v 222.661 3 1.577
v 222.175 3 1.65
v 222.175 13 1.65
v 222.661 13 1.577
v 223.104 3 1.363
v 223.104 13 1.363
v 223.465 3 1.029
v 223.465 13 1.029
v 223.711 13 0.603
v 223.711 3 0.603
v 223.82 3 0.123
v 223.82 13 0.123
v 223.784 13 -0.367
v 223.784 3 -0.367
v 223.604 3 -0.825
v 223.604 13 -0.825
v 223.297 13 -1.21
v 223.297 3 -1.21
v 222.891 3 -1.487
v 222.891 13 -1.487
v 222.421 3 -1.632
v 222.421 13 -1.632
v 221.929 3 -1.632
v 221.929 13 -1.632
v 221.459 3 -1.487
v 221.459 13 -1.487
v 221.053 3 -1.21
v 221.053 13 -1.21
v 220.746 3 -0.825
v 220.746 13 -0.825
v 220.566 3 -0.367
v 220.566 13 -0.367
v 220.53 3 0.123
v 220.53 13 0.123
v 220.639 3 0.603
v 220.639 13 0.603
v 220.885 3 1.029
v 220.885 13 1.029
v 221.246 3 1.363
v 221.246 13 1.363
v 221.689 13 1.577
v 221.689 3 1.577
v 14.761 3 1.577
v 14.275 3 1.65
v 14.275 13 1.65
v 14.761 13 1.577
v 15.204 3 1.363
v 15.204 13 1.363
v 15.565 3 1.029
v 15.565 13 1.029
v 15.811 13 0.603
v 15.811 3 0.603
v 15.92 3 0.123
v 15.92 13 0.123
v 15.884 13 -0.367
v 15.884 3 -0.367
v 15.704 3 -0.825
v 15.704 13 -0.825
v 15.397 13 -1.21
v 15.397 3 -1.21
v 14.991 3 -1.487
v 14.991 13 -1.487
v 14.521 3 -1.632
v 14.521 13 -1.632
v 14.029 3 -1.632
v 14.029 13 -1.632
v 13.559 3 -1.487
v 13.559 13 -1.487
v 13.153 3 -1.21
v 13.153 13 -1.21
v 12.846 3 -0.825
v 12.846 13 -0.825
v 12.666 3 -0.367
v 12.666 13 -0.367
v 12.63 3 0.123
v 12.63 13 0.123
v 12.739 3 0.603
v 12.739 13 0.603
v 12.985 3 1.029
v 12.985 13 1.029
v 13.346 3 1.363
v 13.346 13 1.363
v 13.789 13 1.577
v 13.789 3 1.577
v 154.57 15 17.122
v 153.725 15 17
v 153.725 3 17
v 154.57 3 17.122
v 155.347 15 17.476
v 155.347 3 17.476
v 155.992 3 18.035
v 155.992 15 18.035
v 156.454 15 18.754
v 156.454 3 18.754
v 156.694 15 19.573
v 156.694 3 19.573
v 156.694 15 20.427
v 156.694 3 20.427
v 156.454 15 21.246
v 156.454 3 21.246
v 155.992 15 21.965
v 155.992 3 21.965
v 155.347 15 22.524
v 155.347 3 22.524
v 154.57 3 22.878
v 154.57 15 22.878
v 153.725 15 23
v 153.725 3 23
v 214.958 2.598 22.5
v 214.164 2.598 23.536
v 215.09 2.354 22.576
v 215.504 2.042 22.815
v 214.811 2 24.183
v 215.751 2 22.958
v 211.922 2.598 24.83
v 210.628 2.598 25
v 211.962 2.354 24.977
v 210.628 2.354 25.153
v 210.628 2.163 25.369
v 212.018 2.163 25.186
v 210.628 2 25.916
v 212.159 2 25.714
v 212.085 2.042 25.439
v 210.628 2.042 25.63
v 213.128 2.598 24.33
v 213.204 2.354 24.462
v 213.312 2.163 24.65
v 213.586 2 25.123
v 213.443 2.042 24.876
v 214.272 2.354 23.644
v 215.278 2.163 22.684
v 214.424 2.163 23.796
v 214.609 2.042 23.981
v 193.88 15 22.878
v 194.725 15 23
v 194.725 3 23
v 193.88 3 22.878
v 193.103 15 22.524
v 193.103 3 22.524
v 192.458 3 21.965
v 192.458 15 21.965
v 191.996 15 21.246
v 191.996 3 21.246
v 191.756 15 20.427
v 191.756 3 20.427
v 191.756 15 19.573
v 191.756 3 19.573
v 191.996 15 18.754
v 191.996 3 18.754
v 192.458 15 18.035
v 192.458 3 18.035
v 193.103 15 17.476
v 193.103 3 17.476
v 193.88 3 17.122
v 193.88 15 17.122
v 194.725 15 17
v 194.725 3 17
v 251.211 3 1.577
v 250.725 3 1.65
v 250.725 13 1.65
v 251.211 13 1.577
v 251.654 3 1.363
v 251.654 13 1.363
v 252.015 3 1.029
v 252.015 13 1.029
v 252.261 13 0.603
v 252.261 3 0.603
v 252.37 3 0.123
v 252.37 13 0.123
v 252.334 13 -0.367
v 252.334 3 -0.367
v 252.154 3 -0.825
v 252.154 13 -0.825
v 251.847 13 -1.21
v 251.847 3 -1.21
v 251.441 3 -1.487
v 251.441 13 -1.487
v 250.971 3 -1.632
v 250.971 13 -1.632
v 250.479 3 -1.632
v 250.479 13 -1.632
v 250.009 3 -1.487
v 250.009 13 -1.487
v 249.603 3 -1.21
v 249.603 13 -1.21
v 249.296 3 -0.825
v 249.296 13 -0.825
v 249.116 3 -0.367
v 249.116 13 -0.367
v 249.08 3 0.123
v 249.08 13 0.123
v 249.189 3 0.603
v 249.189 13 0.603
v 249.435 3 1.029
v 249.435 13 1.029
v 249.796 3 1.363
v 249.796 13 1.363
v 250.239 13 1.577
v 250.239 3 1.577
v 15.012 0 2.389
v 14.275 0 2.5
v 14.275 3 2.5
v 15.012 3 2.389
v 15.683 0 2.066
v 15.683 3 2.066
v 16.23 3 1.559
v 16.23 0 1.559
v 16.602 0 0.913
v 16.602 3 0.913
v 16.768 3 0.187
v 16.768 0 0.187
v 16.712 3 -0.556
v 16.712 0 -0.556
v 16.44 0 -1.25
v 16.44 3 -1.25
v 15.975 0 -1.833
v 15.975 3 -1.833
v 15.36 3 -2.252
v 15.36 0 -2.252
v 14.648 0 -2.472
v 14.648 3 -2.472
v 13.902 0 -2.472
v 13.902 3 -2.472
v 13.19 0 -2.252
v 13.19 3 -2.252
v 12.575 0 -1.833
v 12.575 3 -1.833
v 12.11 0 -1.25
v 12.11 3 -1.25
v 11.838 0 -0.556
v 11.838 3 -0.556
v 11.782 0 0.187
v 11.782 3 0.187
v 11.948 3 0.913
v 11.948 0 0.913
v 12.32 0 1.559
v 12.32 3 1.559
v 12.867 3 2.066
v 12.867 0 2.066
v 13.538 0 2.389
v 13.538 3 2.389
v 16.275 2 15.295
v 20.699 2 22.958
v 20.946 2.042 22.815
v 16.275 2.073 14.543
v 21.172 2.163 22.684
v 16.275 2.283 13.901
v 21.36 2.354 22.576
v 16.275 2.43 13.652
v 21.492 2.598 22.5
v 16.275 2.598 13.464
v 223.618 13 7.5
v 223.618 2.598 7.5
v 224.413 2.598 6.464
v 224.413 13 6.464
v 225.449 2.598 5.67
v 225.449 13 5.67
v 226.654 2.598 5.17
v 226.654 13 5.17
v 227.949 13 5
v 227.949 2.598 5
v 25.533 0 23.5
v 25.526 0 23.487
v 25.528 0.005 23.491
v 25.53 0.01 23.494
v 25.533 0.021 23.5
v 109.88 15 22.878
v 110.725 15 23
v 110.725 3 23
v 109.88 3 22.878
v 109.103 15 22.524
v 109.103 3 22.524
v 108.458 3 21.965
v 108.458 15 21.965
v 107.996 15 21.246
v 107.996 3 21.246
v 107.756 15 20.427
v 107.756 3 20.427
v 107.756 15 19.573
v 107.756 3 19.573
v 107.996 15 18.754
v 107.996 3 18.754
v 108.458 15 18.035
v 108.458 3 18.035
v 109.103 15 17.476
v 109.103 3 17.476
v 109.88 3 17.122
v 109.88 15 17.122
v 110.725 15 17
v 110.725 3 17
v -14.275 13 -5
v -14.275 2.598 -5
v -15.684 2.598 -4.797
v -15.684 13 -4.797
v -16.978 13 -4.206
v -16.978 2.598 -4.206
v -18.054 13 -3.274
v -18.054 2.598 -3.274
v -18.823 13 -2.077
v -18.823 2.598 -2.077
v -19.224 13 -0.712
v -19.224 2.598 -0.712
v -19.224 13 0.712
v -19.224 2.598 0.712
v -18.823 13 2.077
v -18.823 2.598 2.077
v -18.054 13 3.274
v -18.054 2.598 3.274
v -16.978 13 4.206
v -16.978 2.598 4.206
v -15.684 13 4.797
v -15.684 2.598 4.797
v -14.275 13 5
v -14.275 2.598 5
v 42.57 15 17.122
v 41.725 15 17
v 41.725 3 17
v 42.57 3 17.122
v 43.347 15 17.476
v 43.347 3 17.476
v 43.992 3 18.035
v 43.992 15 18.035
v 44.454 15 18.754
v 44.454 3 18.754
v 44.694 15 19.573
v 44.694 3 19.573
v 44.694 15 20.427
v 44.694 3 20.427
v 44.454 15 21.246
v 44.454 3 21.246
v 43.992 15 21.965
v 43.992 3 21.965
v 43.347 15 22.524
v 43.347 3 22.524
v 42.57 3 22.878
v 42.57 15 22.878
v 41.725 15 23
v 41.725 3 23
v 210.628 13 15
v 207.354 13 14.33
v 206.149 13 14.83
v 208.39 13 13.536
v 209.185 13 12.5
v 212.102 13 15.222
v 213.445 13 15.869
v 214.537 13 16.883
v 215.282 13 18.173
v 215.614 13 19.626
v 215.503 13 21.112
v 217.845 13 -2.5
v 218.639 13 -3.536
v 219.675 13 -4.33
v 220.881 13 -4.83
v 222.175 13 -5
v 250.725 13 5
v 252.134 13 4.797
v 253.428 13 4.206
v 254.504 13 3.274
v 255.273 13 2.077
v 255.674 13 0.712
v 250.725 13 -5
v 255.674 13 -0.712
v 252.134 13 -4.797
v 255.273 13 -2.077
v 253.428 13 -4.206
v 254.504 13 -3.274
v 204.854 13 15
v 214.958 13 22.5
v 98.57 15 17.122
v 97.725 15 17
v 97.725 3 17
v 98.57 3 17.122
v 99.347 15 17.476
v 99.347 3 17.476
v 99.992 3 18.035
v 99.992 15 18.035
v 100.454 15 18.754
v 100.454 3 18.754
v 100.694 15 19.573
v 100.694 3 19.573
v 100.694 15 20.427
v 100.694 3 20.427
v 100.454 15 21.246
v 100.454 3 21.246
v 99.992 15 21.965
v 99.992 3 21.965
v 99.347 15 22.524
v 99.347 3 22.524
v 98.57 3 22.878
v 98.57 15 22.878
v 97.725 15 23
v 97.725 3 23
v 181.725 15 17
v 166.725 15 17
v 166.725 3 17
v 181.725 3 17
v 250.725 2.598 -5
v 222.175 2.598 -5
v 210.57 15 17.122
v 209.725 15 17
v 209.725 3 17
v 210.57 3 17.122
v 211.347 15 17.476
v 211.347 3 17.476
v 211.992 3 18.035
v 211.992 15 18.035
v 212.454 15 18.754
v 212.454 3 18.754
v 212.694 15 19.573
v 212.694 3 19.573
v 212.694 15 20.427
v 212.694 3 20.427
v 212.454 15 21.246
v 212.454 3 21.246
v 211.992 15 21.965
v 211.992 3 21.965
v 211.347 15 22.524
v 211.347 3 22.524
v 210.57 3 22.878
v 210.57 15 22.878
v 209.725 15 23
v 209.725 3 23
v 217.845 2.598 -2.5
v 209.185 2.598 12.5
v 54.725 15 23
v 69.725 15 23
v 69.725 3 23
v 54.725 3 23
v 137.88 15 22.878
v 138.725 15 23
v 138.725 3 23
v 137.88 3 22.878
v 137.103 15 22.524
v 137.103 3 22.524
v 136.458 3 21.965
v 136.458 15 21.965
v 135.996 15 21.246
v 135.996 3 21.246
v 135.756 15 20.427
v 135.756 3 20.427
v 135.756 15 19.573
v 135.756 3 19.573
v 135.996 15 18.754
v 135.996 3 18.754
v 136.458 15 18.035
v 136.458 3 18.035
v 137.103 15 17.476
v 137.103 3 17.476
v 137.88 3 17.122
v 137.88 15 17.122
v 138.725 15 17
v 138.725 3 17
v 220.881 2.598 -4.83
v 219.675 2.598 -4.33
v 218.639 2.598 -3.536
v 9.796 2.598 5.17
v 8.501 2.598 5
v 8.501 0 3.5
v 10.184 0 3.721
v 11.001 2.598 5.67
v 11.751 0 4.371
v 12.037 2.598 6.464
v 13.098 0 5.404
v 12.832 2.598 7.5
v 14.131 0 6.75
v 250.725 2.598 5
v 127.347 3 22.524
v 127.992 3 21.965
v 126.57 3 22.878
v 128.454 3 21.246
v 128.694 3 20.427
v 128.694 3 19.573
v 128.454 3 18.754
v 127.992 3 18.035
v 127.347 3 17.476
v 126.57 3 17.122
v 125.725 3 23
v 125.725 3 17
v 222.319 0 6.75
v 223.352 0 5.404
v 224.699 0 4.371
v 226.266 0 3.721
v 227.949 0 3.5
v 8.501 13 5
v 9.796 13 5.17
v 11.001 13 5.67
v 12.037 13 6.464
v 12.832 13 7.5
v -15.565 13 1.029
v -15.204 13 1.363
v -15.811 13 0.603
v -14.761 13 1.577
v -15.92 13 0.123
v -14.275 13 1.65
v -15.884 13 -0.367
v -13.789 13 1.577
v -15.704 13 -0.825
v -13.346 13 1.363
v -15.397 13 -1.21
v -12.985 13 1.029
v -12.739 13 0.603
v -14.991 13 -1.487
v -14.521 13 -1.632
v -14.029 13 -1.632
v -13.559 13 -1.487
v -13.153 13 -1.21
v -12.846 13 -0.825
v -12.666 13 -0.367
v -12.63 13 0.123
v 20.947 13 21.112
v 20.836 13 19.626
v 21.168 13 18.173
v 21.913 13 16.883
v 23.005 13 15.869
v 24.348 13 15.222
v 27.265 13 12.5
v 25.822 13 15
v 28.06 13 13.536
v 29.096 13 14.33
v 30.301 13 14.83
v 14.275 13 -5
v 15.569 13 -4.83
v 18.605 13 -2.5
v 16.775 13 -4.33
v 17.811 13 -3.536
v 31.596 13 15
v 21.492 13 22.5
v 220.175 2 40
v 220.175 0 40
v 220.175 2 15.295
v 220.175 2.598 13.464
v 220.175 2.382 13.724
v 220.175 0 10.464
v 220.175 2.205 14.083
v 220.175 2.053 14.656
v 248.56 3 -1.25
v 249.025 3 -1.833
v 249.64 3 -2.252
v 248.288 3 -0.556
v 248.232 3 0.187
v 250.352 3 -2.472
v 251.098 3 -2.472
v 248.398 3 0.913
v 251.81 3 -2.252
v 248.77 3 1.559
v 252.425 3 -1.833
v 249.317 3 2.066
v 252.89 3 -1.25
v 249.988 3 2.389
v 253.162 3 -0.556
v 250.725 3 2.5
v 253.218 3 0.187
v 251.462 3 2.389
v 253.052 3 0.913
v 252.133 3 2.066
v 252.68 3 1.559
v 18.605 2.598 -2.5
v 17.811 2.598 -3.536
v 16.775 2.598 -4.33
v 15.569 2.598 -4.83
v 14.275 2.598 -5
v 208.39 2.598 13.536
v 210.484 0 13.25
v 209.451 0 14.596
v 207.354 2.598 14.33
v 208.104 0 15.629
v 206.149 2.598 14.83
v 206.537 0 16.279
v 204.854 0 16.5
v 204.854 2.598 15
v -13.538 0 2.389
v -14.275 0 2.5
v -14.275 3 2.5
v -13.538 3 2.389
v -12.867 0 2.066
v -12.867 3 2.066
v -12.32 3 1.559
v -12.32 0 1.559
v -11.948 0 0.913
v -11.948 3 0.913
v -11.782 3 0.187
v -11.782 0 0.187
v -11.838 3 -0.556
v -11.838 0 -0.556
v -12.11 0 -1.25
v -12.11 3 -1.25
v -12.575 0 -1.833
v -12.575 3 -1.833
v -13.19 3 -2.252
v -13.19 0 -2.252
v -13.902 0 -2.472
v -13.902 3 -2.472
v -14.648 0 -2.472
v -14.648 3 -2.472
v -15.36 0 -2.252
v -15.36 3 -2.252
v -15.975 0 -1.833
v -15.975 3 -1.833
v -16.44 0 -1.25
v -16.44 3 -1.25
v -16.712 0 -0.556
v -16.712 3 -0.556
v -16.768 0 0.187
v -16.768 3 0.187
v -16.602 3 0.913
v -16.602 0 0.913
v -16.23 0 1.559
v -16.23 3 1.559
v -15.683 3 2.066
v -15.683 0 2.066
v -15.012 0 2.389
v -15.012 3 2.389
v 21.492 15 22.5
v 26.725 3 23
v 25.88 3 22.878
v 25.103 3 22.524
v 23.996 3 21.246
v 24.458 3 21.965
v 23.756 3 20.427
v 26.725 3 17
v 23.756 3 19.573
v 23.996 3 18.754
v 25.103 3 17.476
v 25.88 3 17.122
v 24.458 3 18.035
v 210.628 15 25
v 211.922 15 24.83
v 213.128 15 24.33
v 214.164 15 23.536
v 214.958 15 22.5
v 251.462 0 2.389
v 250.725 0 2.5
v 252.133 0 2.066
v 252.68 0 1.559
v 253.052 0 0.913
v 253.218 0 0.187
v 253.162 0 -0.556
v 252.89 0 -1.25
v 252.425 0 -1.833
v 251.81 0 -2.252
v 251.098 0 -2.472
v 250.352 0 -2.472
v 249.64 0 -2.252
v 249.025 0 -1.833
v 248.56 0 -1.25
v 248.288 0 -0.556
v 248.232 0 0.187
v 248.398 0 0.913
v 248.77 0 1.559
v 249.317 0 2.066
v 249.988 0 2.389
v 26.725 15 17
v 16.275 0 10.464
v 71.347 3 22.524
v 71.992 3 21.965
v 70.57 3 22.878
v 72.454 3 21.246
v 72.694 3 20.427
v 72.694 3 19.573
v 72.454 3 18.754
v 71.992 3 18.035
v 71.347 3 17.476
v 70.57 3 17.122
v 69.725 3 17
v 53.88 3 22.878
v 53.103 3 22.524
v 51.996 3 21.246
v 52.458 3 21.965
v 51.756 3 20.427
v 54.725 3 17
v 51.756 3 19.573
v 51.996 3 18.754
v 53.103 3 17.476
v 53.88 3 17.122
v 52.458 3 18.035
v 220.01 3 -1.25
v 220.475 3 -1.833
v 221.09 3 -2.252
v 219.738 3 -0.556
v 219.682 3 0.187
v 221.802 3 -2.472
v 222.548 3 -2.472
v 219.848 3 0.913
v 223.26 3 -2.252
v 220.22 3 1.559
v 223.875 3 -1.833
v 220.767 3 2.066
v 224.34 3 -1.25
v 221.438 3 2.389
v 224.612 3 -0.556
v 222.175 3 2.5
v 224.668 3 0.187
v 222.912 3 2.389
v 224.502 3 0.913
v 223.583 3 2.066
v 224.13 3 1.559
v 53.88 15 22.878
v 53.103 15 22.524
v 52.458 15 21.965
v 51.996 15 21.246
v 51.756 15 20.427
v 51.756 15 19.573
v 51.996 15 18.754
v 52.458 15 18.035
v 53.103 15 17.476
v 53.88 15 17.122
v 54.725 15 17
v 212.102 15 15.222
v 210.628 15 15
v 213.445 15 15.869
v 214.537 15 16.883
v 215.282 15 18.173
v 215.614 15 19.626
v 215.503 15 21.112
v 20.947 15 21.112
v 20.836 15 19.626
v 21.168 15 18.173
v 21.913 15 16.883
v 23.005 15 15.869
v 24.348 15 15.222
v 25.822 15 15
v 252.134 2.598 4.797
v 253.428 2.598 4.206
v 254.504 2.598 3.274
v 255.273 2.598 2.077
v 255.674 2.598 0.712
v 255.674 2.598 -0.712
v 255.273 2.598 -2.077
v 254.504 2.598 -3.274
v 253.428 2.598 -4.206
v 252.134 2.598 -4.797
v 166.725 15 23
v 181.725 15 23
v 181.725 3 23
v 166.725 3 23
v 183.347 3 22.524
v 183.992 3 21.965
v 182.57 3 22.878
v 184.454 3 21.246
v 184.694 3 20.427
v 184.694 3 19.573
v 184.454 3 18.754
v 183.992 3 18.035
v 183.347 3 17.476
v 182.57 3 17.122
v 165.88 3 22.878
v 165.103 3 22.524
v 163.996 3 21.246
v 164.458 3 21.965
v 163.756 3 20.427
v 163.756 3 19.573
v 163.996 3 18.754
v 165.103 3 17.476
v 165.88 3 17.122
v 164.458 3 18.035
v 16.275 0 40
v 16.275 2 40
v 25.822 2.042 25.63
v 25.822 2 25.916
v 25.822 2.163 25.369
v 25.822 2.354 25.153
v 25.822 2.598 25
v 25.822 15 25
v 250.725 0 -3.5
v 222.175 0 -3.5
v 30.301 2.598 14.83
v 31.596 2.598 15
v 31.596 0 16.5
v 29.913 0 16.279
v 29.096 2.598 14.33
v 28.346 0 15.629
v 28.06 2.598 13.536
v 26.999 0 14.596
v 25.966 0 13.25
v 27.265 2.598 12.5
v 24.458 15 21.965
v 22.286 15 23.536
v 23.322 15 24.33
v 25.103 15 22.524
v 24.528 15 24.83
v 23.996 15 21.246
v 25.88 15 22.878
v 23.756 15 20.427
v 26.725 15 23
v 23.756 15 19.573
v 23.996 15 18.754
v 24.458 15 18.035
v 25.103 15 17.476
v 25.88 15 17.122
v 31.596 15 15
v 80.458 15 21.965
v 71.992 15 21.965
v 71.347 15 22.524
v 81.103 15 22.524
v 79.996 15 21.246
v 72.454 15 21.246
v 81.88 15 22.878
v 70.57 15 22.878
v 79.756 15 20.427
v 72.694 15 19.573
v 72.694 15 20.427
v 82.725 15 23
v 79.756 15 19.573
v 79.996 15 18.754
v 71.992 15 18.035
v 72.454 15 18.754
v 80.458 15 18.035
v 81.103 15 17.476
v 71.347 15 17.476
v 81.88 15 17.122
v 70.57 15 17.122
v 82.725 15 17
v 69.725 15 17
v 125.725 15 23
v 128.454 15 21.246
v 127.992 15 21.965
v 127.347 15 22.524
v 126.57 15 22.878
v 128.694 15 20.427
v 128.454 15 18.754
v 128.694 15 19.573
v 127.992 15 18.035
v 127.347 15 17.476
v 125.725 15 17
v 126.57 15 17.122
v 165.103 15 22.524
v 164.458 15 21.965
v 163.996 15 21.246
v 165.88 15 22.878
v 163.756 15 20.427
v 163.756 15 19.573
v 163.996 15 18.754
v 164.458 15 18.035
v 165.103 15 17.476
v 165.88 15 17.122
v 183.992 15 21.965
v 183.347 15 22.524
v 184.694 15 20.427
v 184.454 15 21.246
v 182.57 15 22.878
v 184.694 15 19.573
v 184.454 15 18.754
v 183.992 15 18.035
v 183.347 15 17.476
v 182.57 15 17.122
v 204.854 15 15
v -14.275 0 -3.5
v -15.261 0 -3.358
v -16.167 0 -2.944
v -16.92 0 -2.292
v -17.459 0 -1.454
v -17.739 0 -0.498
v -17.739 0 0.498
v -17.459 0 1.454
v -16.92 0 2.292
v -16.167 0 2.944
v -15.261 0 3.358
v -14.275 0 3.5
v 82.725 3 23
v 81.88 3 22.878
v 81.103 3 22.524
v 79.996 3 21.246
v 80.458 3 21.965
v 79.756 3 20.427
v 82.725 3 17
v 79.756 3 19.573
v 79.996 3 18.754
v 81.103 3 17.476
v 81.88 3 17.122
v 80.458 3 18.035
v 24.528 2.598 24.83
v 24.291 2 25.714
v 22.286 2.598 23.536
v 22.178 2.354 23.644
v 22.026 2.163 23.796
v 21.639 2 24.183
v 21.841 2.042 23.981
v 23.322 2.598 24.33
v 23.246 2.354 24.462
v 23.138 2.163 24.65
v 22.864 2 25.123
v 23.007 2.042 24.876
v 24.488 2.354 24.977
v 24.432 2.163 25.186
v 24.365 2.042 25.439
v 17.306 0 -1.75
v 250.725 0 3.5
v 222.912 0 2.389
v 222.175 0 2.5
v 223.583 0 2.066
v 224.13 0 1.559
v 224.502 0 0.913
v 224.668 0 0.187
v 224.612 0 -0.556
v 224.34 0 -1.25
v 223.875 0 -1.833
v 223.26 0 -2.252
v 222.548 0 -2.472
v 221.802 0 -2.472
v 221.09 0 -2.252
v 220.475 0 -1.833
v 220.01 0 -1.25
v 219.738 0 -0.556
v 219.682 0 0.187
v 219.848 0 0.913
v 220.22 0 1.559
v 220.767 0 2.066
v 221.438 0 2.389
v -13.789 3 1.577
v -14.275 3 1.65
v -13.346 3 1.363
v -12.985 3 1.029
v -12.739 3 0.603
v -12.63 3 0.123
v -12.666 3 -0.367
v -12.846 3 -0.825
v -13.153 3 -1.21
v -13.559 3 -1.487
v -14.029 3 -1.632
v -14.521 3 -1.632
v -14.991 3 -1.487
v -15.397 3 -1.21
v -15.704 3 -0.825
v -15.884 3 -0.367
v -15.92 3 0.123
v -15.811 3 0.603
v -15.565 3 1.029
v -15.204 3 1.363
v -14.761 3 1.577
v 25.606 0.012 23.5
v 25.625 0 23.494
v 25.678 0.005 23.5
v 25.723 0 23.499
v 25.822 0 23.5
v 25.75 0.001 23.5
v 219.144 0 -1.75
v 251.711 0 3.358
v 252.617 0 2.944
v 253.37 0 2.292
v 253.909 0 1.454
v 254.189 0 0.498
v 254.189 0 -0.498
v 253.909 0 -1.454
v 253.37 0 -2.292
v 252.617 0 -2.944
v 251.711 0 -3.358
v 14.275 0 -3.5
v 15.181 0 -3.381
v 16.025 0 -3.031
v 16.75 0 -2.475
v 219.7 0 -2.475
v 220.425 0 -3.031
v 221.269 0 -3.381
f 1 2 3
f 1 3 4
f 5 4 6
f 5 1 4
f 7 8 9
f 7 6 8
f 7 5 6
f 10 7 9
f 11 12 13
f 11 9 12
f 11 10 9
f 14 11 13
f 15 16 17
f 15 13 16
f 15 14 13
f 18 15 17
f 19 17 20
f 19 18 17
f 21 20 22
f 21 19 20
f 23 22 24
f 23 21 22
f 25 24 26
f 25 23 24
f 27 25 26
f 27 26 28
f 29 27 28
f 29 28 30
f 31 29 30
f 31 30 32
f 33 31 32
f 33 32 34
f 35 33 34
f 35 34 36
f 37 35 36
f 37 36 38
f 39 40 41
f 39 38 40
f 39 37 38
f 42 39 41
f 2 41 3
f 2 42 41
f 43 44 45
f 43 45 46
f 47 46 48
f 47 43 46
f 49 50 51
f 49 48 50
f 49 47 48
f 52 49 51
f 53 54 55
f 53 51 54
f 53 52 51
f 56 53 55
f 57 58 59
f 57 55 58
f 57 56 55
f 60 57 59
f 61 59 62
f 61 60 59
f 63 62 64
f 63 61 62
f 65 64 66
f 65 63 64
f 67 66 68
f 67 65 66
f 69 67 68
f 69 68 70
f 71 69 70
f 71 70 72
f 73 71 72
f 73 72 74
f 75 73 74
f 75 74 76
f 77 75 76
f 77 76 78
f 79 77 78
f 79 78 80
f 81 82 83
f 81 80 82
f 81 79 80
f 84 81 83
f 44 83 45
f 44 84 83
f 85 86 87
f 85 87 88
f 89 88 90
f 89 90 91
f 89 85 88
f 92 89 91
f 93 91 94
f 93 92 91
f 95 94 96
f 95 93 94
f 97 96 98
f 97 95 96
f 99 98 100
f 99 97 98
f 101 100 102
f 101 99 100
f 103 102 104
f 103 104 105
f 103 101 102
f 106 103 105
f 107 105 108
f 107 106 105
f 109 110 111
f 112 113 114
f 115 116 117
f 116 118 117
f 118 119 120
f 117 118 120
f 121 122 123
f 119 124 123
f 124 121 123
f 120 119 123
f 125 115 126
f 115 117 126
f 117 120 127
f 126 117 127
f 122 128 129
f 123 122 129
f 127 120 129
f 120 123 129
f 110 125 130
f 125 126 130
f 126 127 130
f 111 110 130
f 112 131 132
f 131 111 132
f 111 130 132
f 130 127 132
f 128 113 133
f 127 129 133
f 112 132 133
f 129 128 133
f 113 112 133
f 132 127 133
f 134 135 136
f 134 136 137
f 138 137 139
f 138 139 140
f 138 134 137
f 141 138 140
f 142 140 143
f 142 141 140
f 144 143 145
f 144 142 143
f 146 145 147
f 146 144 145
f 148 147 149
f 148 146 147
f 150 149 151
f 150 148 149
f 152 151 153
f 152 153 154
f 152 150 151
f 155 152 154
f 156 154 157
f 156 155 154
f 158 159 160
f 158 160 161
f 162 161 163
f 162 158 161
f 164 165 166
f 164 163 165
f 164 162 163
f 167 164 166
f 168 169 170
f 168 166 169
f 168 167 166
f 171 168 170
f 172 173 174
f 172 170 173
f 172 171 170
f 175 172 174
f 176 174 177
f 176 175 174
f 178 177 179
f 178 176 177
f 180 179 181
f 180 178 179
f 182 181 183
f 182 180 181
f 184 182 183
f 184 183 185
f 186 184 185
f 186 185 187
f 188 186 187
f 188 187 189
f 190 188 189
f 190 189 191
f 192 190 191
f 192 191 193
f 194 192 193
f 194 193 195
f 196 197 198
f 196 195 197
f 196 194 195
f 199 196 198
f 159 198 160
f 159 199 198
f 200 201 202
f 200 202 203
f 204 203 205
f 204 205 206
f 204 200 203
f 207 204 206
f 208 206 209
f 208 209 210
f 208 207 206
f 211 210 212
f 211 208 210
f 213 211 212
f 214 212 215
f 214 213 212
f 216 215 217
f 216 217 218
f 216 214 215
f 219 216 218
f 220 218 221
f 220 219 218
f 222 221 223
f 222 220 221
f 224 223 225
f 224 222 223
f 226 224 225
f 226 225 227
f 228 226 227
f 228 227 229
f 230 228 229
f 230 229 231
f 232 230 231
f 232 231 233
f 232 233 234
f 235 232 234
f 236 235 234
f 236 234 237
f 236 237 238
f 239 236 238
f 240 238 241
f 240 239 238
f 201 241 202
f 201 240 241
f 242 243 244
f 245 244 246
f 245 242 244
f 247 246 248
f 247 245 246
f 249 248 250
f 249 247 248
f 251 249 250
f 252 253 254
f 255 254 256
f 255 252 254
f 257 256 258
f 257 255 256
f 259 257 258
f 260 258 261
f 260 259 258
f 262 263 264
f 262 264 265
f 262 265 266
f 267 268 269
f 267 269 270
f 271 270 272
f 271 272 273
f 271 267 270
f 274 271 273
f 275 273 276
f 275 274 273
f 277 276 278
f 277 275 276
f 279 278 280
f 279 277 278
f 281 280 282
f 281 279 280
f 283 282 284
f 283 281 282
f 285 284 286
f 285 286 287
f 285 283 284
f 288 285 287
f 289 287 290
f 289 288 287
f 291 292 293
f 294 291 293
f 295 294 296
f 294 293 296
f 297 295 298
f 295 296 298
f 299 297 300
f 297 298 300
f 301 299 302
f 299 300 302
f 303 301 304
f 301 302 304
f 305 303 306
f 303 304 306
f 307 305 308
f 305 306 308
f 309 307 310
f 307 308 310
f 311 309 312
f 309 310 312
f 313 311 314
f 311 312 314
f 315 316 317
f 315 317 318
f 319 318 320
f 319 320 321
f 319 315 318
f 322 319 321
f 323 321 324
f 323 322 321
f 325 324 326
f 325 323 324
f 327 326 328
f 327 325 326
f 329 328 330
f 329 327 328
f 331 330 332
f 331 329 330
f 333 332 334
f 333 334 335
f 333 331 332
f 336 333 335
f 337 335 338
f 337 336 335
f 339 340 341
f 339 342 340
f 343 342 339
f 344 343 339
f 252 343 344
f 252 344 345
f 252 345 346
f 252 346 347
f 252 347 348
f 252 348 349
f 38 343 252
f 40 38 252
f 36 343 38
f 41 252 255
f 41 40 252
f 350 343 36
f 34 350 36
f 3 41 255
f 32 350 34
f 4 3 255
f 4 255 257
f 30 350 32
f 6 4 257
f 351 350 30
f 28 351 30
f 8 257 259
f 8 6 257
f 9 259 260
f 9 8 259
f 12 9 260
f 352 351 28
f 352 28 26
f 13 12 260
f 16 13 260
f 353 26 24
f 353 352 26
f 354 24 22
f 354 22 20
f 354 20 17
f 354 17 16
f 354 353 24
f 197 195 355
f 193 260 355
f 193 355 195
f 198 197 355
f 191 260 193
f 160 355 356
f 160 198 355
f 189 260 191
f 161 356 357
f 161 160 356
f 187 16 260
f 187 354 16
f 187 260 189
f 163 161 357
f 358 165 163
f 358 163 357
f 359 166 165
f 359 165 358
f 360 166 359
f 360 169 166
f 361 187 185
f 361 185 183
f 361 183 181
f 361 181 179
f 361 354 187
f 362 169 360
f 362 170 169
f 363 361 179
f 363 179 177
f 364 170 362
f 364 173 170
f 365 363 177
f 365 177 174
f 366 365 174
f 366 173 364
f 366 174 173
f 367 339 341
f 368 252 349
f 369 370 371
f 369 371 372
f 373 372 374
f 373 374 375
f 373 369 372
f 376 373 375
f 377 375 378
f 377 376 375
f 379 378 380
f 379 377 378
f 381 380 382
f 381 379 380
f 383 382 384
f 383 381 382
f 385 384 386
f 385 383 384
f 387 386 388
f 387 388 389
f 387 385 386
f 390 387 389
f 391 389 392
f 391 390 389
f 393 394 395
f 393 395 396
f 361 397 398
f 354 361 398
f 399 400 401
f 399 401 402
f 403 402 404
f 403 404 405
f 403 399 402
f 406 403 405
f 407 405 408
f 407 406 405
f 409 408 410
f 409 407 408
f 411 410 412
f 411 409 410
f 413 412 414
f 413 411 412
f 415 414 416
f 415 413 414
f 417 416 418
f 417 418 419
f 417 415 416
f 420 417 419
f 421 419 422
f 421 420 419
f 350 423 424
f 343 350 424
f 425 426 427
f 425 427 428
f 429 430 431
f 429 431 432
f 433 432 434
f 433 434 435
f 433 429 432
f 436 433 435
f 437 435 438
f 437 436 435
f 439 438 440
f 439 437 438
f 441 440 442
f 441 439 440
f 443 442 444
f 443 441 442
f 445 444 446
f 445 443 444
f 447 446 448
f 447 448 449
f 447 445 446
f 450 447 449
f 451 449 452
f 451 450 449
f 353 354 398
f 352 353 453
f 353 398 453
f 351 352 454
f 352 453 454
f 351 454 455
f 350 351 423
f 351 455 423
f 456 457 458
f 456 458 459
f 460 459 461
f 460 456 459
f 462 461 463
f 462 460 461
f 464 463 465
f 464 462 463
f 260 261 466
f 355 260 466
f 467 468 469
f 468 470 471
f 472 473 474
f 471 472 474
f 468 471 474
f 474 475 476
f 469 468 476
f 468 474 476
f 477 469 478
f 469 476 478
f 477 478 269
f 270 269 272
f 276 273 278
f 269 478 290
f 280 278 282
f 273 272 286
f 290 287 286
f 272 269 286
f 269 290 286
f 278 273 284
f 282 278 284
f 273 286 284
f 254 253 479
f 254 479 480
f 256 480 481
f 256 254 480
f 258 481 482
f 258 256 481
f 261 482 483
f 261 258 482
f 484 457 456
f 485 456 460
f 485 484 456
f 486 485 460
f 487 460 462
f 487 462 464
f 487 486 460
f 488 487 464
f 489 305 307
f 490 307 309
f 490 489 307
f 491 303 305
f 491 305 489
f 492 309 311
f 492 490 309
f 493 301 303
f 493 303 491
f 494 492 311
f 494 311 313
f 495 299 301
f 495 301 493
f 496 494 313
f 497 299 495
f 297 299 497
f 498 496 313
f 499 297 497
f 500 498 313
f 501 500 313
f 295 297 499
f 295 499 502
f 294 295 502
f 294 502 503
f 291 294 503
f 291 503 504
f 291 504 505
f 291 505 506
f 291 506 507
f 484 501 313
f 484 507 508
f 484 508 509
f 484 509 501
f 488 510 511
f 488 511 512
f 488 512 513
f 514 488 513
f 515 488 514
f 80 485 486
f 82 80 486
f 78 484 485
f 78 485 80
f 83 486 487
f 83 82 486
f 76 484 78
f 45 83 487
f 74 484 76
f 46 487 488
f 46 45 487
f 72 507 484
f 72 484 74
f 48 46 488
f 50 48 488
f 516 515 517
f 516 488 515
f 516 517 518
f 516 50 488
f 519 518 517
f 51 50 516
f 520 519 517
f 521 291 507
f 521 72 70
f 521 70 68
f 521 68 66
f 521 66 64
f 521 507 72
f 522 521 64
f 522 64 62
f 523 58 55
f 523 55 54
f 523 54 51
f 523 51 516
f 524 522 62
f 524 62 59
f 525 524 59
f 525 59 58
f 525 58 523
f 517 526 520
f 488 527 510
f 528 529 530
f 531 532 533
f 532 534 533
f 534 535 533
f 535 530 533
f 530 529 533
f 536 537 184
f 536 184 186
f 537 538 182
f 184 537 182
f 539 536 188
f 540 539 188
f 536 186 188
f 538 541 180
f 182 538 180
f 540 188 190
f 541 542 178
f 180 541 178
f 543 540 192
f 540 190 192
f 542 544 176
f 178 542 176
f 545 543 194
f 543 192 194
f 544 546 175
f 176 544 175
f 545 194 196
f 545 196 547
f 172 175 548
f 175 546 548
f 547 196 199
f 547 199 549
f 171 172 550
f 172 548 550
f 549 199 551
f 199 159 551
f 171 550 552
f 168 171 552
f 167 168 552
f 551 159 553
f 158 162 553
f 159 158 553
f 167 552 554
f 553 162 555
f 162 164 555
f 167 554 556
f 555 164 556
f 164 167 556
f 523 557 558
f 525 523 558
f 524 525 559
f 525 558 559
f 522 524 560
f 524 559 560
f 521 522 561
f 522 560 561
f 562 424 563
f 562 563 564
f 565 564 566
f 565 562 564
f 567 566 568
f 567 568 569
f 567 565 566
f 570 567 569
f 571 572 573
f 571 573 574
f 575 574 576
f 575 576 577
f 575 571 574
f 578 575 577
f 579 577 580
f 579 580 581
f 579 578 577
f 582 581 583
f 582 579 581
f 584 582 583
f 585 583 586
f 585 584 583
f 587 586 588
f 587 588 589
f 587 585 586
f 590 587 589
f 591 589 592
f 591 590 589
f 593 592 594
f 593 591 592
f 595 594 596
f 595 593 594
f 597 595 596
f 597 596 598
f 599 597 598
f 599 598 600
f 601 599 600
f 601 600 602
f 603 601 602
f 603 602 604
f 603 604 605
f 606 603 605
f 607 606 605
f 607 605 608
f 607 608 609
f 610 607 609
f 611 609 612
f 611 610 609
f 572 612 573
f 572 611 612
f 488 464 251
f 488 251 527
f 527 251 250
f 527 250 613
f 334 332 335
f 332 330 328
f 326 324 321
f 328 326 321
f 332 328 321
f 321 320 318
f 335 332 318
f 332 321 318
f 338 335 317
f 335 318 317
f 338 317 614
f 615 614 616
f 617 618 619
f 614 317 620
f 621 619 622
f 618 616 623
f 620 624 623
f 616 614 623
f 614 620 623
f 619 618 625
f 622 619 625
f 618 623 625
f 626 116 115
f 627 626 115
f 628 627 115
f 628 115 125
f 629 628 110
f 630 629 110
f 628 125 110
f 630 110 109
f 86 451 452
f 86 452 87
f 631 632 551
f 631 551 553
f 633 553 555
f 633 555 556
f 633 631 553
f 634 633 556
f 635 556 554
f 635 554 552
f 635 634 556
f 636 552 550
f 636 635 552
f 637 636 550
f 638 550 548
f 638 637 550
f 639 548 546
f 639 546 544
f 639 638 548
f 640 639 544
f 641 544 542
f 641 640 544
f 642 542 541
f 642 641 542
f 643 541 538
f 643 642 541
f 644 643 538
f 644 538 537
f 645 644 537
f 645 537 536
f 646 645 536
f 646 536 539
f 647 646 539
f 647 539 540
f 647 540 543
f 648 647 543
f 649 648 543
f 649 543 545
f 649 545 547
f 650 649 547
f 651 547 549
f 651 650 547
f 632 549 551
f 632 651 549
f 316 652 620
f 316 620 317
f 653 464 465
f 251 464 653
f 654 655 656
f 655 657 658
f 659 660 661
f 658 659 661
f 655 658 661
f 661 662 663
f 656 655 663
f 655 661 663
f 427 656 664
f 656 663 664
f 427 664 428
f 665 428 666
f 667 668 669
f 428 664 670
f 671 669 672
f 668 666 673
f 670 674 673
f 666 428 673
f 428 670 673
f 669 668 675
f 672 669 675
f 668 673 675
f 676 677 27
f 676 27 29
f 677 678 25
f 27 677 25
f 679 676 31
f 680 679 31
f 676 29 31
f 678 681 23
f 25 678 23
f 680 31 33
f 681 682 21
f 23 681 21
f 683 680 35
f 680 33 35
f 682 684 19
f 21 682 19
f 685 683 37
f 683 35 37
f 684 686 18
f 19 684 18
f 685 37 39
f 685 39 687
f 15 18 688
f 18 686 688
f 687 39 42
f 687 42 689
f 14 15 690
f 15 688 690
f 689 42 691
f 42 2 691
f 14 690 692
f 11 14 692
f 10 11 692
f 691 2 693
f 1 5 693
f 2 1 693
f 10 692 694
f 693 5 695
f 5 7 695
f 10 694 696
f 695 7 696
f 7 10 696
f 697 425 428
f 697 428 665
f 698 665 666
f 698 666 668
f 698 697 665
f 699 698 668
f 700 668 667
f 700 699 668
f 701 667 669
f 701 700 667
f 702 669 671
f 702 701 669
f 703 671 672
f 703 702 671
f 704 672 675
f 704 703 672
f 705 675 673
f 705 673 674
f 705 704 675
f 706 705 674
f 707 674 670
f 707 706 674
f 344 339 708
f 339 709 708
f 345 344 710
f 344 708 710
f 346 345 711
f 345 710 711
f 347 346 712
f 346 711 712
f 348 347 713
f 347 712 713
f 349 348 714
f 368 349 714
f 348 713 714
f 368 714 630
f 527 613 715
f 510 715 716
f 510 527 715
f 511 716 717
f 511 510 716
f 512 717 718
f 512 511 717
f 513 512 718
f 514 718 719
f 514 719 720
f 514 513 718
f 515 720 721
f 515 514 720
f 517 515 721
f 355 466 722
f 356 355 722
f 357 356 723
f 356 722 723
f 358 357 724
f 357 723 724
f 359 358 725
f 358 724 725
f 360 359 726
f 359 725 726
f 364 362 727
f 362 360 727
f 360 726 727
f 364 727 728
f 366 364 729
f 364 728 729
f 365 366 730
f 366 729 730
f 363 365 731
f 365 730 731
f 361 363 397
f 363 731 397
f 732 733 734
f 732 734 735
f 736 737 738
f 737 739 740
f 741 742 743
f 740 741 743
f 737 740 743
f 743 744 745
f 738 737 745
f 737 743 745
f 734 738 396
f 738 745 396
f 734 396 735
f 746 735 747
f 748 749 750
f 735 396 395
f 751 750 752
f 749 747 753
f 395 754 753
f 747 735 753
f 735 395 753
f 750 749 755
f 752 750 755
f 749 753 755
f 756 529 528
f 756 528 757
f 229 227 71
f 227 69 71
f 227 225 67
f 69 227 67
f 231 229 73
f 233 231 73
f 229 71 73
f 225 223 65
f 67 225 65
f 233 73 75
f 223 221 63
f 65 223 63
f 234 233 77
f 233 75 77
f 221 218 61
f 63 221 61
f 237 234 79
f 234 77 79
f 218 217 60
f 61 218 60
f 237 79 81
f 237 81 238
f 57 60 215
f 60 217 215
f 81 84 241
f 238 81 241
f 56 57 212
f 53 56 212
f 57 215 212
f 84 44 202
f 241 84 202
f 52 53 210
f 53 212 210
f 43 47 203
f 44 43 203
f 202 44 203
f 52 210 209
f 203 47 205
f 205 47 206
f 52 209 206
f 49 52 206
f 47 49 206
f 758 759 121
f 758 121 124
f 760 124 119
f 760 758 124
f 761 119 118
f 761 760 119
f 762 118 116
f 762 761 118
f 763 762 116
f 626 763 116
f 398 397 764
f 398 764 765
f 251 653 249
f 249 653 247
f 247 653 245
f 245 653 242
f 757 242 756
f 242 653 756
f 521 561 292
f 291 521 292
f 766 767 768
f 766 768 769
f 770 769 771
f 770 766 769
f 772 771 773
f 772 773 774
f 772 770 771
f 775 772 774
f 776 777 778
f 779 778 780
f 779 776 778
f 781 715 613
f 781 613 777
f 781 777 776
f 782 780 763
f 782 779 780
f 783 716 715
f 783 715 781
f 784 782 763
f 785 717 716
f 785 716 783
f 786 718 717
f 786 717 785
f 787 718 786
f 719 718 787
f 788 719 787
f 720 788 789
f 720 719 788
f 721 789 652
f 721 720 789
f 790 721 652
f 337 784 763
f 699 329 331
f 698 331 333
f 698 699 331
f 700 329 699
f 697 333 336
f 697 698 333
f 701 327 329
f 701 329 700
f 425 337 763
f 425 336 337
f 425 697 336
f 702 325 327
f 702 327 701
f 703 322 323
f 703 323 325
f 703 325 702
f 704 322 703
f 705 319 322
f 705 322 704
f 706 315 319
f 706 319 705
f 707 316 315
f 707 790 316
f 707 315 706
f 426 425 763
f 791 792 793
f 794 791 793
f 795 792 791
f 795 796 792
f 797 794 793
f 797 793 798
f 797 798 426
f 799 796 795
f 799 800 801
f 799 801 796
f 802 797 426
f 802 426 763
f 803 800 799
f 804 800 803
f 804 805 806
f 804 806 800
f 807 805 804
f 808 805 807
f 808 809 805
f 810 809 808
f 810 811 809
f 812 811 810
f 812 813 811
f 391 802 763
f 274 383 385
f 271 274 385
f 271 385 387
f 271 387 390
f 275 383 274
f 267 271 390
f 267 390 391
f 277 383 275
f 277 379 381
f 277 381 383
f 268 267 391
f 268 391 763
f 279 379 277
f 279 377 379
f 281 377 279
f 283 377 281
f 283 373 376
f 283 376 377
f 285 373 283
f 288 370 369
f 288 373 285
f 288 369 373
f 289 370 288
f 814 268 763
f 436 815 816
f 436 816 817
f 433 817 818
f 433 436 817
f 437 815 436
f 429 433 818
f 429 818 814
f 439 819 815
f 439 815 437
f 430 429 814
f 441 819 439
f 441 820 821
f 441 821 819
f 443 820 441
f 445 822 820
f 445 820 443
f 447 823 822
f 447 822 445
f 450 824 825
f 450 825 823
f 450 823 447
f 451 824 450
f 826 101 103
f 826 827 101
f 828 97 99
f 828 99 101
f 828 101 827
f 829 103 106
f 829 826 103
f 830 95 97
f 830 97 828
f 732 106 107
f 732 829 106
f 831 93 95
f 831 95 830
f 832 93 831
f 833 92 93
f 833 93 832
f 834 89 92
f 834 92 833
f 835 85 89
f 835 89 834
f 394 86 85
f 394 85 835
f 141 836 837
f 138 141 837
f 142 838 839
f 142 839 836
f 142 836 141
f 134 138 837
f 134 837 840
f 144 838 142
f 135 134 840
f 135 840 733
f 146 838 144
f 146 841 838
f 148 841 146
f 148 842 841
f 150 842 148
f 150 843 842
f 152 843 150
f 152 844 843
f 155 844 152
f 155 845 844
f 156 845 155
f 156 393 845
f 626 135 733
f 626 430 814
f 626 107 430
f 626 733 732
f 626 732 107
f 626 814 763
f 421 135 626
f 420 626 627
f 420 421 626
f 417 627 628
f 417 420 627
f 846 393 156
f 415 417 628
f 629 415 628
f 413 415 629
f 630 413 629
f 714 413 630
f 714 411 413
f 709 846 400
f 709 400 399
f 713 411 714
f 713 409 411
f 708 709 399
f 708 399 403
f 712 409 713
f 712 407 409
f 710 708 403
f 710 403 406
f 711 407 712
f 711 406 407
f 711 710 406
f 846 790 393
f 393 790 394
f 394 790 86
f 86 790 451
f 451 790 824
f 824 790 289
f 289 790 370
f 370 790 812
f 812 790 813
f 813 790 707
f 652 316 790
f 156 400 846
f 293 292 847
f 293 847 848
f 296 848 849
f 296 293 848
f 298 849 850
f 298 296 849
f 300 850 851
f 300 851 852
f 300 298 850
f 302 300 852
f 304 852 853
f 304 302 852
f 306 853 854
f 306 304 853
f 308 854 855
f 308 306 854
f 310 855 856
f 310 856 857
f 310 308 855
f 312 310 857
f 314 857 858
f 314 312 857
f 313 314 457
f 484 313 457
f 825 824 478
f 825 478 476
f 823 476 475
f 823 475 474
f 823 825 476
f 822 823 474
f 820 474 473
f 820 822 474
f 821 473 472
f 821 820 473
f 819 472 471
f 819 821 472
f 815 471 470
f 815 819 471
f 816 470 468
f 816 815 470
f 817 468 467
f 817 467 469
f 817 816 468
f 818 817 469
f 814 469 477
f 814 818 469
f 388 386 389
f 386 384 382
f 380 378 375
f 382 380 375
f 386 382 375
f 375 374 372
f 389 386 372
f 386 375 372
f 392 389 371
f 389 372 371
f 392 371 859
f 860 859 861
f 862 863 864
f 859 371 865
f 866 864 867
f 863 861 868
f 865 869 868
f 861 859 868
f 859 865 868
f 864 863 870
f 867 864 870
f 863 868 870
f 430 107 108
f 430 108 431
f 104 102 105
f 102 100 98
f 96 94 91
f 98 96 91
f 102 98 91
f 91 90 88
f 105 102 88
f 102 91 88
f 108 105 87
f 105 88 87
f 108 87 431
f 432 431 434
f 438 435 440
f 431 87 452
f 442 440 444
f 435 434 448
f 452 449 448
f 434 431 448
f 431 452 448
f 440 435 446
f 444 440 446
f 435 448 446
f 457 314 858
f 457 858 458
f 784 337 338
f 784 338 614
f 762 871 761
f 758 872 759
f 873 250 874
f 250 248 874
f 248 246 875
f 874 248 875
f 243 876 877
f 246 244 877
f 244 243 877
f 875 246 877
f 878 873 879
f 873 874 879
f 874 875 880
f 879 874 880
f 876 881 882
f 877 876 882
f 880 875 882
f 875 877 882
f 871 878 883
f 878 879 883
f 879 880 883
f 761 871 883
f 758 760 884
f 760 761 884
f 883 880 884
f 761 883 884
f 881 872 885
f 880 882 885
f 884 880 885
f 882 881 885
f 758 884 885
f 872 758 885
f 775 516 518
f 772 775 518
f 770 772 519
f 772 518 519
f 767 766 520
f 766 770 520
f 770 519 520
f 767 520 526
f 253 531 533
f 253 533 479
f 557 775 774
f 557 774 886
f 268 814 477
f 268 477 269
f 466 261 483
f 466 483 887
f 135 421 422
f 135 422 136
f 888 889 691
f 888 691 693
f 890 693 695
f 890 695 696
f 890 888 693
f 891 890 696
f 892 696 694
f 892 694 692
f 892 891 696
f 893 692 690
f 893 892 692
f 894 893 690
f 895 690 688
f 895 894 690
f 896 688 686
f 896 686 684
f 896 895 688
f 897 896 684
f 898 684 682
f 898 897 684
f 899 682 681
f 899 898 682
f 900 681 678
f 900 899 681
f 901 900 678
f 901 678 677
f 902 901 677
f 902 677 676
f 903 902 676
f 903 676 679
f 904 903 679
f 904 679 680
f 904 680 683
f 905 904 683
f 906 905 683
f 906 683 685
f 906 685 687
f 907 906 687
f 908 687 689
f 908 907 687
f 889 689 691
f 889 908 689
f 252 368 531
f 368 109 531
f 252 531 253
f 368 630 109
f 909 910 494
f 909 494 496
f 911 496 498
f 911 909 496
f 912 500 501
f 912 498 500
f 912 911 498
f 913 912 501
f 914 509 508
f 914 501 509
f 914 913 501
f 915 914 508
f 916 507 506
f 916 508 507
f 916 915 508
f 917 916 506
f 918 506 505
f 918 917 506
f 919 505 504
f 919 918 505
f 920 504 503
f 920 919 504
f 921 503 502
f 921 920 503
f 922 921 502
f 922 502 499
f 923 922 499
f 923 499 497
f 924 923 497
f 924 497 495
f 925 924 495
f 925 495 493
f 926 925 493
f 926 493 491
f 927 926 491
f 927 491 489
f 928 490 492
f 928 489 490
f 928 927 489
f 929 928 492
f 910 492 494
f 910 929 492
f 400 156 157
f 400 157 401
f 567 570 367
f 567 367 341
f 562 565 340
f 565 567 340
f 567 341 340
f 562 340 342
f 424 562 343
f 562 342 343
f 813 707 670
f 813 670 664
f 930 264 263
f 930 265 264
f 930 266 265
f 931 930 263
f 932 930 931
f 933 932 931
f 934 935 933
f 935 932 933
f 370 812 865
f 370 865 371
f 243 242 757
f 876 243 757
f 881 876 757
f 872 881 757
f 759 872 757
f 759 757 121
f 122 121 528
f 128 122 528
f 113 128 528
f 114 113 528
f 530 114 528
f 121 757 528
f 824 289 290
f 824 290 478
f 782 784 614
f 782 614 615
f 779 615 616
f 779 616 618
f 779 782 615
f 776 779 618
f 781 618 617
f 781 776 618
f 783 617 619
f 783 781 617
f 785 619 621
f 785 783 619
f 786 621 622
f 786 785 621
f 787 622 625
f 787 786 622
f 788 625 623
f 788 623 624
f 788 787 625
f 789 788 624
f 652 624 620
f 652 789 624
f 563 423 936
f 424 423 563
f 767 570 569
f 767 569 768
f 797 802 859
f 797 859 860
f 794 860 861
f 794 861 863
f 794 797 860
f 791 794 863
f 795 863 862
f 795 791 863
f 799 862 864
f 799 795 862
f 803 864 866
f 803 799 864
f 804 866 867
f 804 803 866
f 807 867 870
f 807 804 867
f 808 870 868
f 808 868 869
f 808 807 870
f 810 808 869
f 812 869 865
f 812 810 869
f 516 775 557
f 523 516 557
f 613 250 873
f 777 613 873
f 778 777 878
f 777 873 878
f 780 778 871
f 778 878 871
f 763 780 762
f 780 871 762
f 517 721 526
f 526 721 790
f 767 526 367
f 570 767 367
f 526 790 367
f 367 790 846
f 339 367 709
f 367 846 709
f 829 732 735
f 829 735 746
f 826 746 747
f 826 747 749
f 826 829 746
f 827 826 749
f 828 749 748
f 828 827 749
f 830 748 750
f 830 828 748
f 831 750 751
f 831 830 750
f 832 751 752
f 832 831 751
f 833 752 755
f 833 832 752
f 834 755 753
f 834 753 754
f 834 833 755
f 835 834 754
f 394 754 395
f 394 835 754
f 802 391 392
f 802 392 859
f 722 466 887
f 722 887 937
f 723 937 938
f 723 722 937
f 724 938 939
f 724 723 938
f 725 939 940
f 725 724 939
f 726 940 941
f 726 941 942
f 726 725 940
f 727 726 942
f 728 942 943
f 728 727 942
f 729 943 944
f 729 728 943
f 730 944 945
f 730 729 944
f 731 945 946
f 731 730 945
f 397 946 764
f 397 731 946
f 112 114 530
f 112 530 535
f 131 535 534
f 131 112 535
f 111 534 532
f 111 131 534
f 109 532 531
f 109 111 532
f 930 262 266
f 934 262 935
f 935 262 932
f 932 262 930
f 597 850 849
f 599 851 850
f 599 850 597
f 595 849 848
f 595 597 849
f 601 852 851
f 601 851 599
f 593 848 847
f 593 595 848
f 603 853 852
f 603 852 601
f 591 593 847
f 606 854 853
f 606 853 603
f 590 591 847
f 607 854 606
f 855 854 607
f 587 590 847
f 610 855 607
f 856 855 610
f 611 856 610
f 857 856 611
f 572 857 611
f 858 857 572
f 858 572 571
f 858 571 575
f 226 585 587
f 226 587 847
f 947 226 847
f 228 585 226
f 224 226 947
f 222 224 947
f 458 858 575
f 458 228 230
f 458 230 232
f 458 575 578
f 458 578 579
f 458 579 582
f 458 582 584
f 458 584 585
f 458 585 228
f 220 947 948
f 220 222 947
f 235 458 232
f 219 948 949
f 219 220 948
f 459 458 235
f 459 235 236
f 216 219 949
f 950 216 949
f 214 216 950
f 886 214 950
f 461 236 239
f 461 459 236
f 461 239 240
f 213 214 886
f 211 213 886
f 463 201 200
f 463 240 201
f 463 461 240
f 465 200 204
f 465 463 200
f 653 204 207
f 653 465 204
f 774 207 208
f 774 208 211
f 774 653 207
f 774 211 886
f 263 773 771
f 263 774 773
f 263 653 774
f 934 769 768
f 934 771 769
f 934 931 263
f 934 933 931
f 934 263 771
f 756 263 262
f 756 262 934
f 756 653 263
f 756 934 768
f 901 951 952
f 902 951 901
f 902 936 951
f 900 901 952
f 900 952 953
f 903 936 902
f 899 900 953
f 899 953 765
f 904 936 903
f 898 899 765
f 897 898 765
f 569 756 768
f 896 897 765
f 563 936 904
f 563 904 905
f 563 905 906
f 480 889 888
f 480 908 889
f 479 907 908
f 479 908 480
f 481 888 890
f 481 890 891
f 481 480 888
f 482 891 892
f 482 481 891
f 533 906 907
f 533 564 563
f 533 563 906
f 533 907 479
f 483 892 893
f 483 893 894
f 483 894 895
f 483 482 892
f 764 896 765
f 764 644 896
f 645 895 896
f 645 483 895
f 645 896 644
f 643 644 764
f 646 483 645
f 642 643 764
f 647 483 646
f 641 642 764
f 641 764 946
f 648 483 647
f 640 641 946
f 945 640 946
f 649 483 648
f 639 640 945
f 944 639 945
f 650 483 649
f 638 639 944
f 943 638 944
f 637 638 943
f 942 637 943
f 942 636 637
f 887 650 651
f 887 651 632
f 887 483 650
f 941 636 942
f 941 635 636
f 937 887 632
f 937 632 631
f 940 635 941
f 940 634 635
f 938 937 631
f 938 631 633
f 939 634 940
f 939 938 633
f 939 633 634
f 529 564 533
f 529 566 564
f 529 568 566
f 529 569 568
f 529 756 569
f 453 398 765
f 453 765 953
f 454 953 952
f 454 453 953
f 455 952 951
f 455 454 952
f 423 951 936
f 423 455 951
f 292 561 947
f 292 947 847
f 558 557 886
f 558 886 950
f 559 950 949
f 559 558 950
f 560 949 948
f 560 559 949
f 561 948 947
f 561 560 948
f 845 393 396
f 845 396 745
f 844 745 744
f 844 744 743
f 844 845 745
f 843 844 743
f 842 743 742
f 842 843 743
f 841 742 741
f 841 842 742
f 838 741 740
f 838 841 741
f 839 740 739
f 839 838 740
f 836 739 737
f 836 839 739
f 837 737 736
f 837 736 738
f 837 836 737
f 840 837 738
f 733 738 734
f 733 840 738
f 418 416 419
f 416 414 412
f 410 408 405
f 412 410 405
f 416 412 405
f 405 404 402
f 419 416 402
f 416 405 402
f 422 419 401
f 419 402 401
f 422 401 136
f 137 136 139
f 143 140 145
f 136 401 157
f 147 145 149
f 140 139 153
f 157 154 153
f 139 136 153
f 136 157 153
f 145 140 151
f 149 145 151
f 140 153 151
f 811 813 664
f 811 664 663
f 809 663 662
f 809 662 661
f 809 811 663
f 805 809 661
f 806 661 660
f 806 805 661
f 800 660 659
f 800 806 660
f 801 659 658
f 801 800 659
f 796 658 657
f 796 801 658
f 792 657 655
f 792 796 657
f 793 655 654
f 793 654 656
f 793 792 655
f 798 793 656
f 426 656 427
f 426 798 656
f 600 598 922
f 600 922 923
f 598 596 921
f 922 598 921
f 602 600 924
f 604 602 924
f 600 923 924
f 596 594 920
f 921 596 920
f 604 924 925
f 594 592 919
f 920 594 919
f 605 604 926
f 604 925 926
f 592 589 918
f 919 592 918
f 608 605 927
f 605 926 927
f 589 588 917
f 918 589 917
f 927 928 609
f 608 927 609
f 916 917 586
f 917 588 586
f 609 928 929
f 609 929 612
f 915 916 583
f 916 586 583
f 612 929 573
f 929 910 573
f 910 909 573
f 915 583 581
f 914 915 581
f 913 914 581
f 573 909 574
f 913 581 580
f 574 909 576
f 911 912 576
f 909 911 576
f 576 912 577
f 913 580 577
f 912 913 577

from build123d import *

# Parameters (mm, degrees)
SKETCH_1_R                 = 1.65
EXTRUDE_1_DEPTH            = 15
FILLET_1_R                 = 5
CHAMFER_1_SIZE             = 1.5
CHAMFER_1_SIZE2            = 2.598076211
SKETCH_3_R                 = 2.5
CUT_EXTRUDE_1_DEPTH        = 3
SKETCH_4_W                 = 353.760068279
SKETCH_4_H                 = 71.916373997
CUT_EXTRUDE_2_DEPTH        = 2
FILLET_2_R                 = 5
CUT_EXTRUDE_3_DEPTH        = 12
PATTERN_LINEAR_1_COUNT     = 4
PATTERN_LINEAR_1_PITCH     = 28
PATTERN_LINEAR_1_COL_COUNT = 4
PATTERN_LINEAR_1_COL_PITCH = 28
EXTRUDE_2_DEPTH            = 2
FILLET_3_R                 = 1


# Some blends are built 0.0001 mm under size
with BuildPart() as part:
    # 草图1 → 凸台-拉伸1 (new body)
    with BuildSketch(Plane(origin=(0, 0, 0), x_dir=(1, 0, 0), z_dir=(0, 1, 0))):
        with BuildLine():
            Line((14.275, 5), (-14.275, 5))
            ThreePointArc((-14.275, 5), (-19.275, 0), (-14.275, -5))
            Line((-14.275, -5), (11.388248654, -5))
            Line((11.388248654, -5), (21.491878365, -22.5))
            ThreePointArc((21.491878365, -22.5), (23.322005384, -24.330127019), (25.822005384, -25))
            Line((25.822005384, -25), (210.627994616, -25))
            ThreePointArc((210.627994616, -25), (213.127994616, -24.330127019), (214.958121635, -22.5))
            Line((214.958121635, -22.5), (225.061751346, -5))
            Line((225.061751346, -5), (250.725, -5))
            ThreePointArc((250.725, -5), (255.725, 0), (250.725, 5))
            Line((250.725, 5), (222.175, 5))
            ThreePointArc((222.175, 5), (219.675, 4.330127019), (217.844872981, 2.5))
            Line((217.844872981, 2.5), (207.74124327, -15))
            Line((207.74124327, -15), (28.70875673, -15))
            Line((28.70875673, -15), (18.605127019, 2.5))
            ThreePointArc((18.605127019, 2.5), (16.775, 4.330127019), (14.275, 5))
        make_face()
        with Locations(Location((-14.275, 0, 0), (0, 0, 270))):
            Circle(SKETCH_1_R, mode=Mode.SUBTRACT)
        with Locations(Location((14.275, 0, 0), (0, 0, 270))):
            Circle(SKETCH_1_R, mode=Mode.SUBTRACT)
        with Locations(Location((222.175, 0, 0), (0, 0, 270))):
            Circle(SKETCH_1_R, mode=Mode.SUBTRACT)
        with Locations(Location((250.725, 0, 0), (0, 0, 270))):
            Circle(SKETCH_1_R, mode=Mode.SUBTRACT)
    extrude(amount=EXTRUDE_1_DEPTH)

    # 圆角1
    fillet_1_edges = [part.edges().sort_by_distance(p)[0] for p in [
        (225.061751346, 7.5, 5),
        (11.388248654, 7.5, 5),
        (28.70875673, 7.5, 15),
        (207.74124327, 7.5, 15),
    ]]
    fillet(fillet_1_edges, radius=FILLET_1_R)

    # 倒角1
    chamfer_1_edges = [part.edges().sort_by_distance(p)[0] for p in [
        (255.725, 0, 0),
        (219.288248654, 0, 15),
        (213.127994616, 0, 24.330127019),
        (118.225, 0, 25),
        (23.322005384, 0, 24.330127019),
        (-2.886751346, 0, 5),
        (-19.275, 0, 0),
        (0, 0, -5),
        (16.775, 0, -4.330127019),
        (22.935254038, 0, 5),
        (219.675, 0, -4.330127019),
        (236.45, 0, -5),
        (118.225, 0, 15),
        (213.514745962, 0, 5),
        (239.336751346, 0, 5),
        (17.161751346, 0, 15),
        (207.354491924, 0, 14.330127019),
        (29.095508076, 0, 14.330127019),
        (225.448502692, 0, 5.669872981),
        (11.001497308, 0, 5.669872981),
    ]]
    chamfer_1_side = [part.faces().sort_by_distance(p)[0] for p in [
        (216.892549382, 0, 13.616842381),
    ]]
    chamfer(chamfer_1_edges, length=CHAMFER_1_SIZE, length2=CHAMFER_1_SIZE2, reference=chamfer_1_side[0])

    # 草图3 → 切除-拉伸1 (cut)
    with BuildSketch(Plane(origin=(0, 0, 0), x_dir=(1, 0, 0), z_dir=(0, 1, 0))):
        with Locations(Location((-14.275, 0, 0), (0, 0, 270))):
            Circle(SKETCH_3_R)
        with Locations(Location((14.275, 0, 0), (0, 0, 270))):
            Circle(SKETCH_3_R)
        with Locations(Location((250.725, 0, 0), (0, 0, 270))):
            Circle(SKETCH_3_R)
        with Locations(Location((222.175, 0, 0), (0, 0, 270))):
            Circle(SKETCH_3_R)
    extrude(amount=CUT_EXTRUDE_1_DEPTH, mode=Mode.SUBTRACT)

    # 草图4 → 切除-拉伸2 (cut)
    with BuildSketch(Plane(origin=(0, 15, 0), x_dir=(1, 0, 0), z_dir=(0, 1, 0))):
        with Locations((127.300161481, 20.958186999)):
            Rectangle(SKETCH_4_W, SKETCH_4_H)
    extrude(amount=-CUT_EXTRUDE_2_DEPTH, mode=Mode.SUBTRACT)

    # 圆角2
    fillet_2_edges = [part.edges().sort_by_distance(p)[0] for p in [
        (17.161751346, 14, 15),
        (219.288248654, 14, 15),
    ]]
    fillet(fillet_2_edges, radius=FILLET_2_R - 0.0001)  # a hair under: the kernel refuses the full size

    # 草图5 → 切除-拉伸3 (cut)
    with BuildSketch(Plane(origin=(0, 15, 0), x_dir=(1, 0, 0), z_dir=(0, 1, 0))):
        with BuildLine():
            Line((110.725, -17), (125.725, -17))
            ThreePointArc((125.725, -17), (128.725, -20), (125.725, -23))
            Line((125.725, -23), (110.725, -23))
            ThreePointArc((110.725, -23), (107.725, -20), (110.725, -17))
        make_face()
    cut_extrude_3 = extrude(amount=-CUT_EXTRUDE_3_DEPTH, mode=Mode.SUBTRACT)

    # 阵列(线性)1: 切除-拉伸3 ×4
    with Locations(*[(i * PATTERN_LINEAR_1_PITCH, 0, 0) for i in range(1, PATTERN_LINEAR_1_COUNT)]):
        add(cut_extrude_3, mode=Mode.SUBTRACT)

    # 阵列(线性)1 col: 切除-拉伸3 ×4
    with Locations(*[(-i * PATTERN_LINEAR_1_COL_PITCH, 0, 0) for i in range(1, PATTERN_LINEAR_1_COL_COUNT)]):
        add(cut_extrude_3, mode=Mode.SUBTRACT)

    # 草图6 → 凸台-拉伸2 (add)
    with BuildSketch(Plane.XZ):
        Polygon((25.533330249, 23.5), (210.339319482, 23.5), (220.175, 6.464101615), (220.175, 23.5), (220.175, 40), (16.275, 40), (16.275, 23), (16.275, 7.464101615), align=None)
    extrude(amount=-EXTRUDE_2_DEPTH)

    # 圆角3
    # the kernel refuses this fillet: 1 mm, written as the material it adds along each edge
    with BuildSketch(Plane(origin=(214.659083529, 2, 22.327350269), x_dir=(0.4330127018948014, 0.8660254037827173, 0.2500000000014904), z_dir=(0.4999999999999995, 0, -0.866025403784439))) as fillet_3_piece_1_section:
        with BuildLine():
            CenterArc((1.496511696, 0.592034292), FILLET_3_R, 150, 66.301500994)
            Line((0.630486292, 1.092034292), (0.613165784, 1.102034292))
            Line((0.613165784, 1.102034292), (-0.017320508, 0.01))
            Line((-0.017320508, 0.01), (0, -0.02))
            ThreePointArc((0, -0.02), (0.345299462, -0.02), (0.674480668, -0.011840686))
            Line((0.674480668, -0.011840686), (0.690598923, 0))
        make_face()
    fillet_3_piece_1 = extrude(amount=14.184264403, mode=Mode.PRIVATE)
    fillet_3_piece_1 = split(fillet_3_piece_1, bisect_by=Plane(origin=(220.175, 2.148183279, 18.272519996), z_dir=(-1, 0, 0)), keep=Keep.TOP, mode=Mode.PRIVATE)
    add(fillet_3_piece_1)
    with BuildSketch(Plane(origin=(210.627994616, 2, 20), x_dir=(0, 0, 1), z_dir=(-1, 0, 0))) as fillet_3_piece_2:
        with BuildLine():
            CenterArc((5.915673123, 1), FILLET_3_R, 203.698499006, 66.301500994)
            Line((5.915673123, 0), (5.915673123, -0.02))
            Line((5.915673123, -0.02), (4.654700538, -0.02))
            Line((4.654700538, -0.02), (4.63738003, 0.01))
            ThreePointArc((4.63738003, 0.01), (4.810029761, 0.309038106), (4.981686538, 0.590037736))
            Line((4.981686538, 0.590037736), (5, 0.598076211))
        make_face()
    revolve(axis=Axis((210.627994616, 2, 20), (0, 1, 0)), revolution_arc=60)
    with BuildSketch(Plane(origin=(25.822005384, 2, 24.654700538), x_dir=(0, 0, 1), z_dir=(1, 0, 0))) as fillet_3_piece_3:
        with BuildLine():
            CenterArc((1.260972585, -1), FILLET_3_R, 90, 66.301500994)
            Line((0.345299462, -0.598076211), (0.326985999, -0.590037736))
            ThreePointArc((0.326985999, -0.590037736), (0.155329223, -0.309038106), (-0.017320508, -0.01))
            Line((-0.017320508, -0.01), (0, 0.02))
            Line((0, 0.02), (1.260972585, 0.02))
            Line((1.260972585, 0.02), (1.260972585, 0))
        make_face()
    extrude(amount=184.805989232)
    with BuildSketch(Plane(origin=(25.822005384, 2, 20), x_dir=(-0.8660254037844389, 0, 0.49999999999999944), z_dir=(-0.49999999999999944, 0, -0.8660254037844389))) as fillet_3_piece_4:
        with BuildLine():
            CenterArc((5.915673123, 1), FILLET_3_R, 203.698499006, 66.301500994)
            Line((5, 0.598076211), (4.981686538, 0.590037736))
            ThreePointArc((4.981686538, 0.590037736), (4.810029761, 0.309038106), (4.63738003, 0.01))
            Line((4.63738003, 0.01), (4.654700538, -0.02))
            Line((4.654700538, -0.02), (5.915673123, -0.02))
            Line((5.915673123, -0.02), (5.915673123, 0))
        make_face()
    revolve(axis=Axis((25.822005384, 2, 20), (0, 1, 0)), revolution_arc=60)
    with BuildSketch(Plane(origin=(14.698784269, 2, 10.043416963), x_dir=(-0.86602540378444, 0, 0.4999999999999978), z_dir=(0.4999999999999977, 0, 0.86602540378444))) as fillet_3_piece_5_section:
        with BuildLine():
            CenterArc((1.260972585, -1), FILLET_3_R, 90, 66.301500994)
            Line((0.345299462, -0.598076211), (0.326985999, -0.590037736))
            ThreePointArc((0.326985999, -0.590037736), (0.155329223, -0.309038106), (-0.017320508, -0.01))
            Line((-0.017320508, -0.01), (0, 0.02))
            Line((0, 0.02), (1.260972585, 0.02))
            Line((1.260972585, 0.02), (1.260972585, 0))
        make_face()
    fillet_3_piece_5 = extrude(amount=14.184264403, mode=Mode.PRIVATE)
    fillet_3_piece_5 = split(fillet_3_piece_5, bisect_by=Plane(origin=(16.275, 2.148183279, 18.272519996), z_dir=(1, 0, 0)), keep=Keep.TOP, mode=Mode.PRIVATE)
    add(fillet_3_piece_5)


solid = part.part
